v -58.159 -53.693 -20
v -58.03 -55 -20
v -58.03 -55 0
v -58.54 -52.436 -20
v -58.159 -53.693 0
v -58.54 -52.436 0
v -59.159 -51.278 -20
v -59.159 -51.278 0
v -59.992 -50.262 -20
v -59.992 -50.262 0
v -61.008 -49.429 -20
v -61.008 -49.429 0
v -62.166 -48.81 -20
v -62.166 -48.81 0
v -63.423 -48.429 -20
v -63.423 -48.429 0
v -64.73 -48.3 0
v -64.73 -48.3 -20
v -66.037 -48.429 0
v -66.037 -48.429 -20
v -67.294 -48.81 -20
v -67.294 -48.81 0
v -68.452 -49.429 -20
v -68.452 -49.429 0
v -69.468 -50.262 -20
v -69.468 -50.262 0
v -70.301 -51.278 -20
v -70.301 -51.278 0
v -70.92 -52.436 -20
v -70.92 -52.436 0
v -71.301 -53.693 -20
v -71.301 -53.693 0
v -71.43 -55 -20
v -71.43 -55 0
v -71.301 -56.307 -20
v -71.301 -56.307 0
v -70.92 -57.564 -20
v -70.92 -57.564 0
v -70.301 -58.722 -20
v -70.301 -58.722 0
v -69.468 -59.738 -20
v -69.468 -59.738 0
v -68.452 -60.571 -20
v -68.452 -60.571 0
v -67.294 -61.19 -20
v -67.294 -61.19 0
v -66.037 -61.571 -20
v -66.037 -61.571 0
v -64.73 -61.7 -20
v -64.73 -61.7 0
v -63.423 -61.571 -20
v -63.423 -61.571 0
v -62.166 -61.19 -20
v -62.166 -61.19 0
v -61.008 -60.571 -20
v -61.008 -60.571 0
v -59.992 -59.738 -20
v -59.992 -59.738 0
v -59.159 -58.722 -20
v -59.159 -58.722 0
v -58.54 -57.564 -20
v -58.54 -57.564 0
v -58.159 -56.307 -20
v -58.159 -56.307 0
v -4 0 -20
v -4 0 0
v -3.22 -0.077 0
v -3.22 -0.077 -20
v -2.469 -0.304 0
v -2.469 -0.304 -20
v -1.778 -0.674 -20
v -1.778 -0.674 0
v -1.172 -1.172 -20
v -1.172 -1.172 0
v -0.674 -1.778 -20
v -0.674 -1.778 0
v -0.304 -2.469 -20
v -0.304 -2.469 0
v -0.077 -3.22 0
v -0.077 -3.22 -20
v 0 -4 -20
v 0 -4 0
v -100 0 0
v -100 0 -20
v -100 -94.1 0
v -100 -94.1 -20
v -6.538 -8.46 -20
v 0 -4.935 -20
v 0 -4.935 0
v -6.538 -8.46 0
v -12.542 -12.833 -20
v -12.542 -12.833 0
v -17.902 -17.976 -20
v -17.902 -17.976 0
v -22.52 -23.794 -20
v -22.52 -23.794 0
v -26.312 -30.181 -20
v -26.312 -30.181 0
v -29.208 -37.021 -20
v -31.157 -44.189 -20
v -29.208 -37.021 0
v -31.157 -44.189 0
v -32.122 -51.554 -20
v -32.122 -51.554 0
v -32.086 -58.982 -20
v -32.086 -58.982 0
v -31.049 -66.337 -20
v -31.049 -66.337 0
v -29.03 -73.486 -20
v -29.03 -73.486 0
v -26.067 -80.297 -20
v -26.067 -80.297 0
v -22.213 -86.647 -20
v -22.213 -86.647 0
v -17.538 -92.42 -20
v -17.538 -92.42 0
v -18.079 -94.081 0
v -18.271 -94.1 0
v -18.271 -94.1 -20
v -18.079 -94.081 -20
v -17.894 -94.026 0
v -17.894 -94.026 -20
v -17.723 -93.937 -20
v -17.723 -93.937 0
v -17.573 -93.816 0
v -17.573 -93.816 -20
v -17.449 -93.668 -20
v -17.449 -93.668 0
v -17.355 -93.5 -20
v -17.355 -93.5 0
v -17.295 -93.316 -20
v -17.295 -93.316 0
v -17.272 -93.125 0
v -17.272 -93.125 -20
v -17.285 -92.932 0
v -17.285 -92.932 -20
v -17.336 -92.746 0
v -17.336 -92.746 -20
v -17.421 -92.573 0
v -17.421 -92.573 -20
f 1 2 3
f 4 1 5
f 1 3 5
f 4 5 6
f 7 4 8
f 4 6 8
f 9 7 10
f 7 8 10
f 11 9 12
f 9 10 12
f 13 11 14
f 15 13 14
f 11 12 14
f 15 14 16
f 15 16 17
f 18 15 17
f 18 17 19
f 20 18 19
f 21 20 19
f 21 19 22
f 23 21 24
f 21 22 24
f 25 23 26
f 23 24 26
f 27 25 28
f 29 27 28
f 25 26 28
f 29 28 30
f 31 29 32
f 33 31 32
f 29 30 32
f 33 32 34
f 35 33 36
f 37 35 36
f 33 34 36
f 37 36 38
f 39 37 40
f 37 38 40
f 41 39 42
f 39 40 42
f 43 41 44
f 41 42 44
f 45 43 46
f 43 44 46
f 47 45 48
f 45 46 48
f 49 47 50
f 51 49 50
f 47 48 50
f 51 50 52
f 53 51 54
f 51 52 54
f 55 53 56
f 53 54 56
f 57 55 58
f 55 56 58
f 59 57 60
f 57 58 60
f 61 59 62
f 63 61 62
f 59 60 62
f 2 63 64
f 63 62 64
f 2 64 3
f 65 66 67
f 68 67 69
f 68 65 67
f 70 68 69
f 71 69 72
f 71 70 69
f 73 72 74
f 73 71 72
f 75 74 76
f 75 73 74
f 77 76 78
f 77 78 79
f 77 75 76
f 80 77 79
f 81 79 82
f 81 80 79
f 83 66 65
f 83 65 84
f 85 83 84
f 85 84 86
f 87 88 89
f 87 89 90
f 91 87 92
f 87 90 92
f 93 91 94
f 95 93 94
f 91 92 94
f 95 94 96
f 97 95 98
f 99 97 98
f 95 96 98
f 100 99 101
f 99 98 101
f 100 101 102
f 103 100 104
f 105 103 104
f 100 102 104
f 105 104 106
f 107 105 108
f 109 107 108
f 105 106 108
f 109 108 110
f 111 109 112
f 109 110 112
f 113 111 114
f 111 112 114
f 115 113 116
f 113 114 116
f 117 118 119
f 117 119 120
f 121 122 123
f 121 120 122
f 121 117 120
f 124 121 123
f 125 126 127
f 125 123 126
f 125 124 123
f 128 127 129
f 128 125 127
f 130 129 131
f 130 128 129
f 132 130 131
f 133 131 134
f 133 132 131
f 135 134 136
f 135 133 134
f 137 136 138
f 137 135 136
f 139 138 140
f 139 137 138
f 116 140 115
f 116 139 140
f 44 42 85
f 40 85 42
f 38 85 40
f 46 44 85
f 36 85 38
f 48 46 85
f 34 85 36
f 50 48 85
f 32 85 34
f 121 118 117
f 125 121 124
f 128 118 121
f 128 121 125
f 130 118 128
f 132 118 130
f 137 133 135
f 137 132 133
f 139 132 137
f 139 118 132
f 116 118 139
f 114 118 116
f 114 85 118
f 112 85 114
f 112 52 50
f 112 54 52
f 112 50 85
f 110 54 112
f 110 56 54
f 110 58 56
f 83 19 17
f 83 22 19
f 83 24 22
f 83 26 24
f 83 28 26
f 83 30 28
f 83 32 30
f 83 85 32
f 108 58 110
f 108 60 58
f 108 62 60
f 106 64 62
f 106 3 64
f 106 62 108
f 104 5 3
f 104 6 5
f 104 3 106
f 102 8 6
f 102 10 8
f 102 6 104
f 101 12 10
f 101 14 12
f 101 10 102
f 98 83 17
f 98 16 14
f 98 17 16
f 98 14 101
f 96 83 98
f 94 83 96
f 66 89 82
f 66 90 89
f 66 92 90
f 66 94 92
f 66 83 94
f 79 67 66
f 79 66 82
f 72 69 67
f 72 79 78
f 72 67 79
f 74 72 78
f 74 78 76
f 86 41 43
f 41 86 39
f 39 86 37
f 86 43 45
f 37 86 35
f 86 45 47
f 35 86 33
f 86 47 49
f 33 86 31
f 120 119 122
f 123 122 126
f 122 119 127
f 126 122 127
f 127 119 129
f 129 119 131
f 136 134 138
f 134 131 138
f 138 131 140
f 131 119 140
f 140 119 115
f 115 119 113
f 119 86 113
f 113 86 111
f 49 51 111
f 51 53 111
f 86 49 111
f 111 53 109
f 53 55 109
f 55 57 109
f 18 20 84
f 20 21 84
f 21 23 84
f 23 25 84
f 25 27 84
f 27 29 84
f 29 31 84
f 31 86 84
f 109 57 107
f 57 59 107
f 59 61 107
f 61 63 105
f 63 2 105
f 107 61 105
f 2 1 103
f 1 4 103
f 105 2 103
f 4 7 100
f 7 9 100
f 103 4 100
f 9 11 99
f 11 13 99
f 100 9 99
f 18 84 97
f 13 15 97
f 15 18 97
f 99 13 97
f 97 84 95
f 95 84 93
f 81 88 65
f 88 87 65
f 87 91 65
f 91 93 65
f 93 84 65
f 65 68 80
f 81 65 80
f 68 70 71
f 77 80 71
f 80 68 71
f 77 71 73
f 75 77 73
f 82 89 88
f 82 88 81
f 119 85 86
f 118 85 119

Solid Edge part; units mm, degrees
sketch "Sketch1" plane through (0, 0, 0) normal (0, 0, 1) x (1, 0, 0)
  line L0 (0, 0) -> (-100, 0)
  line L1 (-100, 0) -> (-100, -94.1)
  line L2 (-100, -94.1) -> (0, -94.1)
  line L3 (0, -94.1) -> (0, 0)
extrude "Protrusion1" add sketch "Sketch1" against normal blind 20
sketch "Sketch2" plane through (-50, -47.05, 0) normal (0, 0, 1) x (1, 0, 0)
  circle A0 centre (-14.73, -7.95) radius 6.7
  circle A1 centre (72.77, -7.95) radius 55
extrude "ExtrudedCutout_1" cut sketch "Sketch2" against normal blind 20
fillet "Round_2" radius 4 1 edges at (0, 0, -10)
fillet "Round_4" radius 1 1 edges at (-15.9106, -94.1, -10)
